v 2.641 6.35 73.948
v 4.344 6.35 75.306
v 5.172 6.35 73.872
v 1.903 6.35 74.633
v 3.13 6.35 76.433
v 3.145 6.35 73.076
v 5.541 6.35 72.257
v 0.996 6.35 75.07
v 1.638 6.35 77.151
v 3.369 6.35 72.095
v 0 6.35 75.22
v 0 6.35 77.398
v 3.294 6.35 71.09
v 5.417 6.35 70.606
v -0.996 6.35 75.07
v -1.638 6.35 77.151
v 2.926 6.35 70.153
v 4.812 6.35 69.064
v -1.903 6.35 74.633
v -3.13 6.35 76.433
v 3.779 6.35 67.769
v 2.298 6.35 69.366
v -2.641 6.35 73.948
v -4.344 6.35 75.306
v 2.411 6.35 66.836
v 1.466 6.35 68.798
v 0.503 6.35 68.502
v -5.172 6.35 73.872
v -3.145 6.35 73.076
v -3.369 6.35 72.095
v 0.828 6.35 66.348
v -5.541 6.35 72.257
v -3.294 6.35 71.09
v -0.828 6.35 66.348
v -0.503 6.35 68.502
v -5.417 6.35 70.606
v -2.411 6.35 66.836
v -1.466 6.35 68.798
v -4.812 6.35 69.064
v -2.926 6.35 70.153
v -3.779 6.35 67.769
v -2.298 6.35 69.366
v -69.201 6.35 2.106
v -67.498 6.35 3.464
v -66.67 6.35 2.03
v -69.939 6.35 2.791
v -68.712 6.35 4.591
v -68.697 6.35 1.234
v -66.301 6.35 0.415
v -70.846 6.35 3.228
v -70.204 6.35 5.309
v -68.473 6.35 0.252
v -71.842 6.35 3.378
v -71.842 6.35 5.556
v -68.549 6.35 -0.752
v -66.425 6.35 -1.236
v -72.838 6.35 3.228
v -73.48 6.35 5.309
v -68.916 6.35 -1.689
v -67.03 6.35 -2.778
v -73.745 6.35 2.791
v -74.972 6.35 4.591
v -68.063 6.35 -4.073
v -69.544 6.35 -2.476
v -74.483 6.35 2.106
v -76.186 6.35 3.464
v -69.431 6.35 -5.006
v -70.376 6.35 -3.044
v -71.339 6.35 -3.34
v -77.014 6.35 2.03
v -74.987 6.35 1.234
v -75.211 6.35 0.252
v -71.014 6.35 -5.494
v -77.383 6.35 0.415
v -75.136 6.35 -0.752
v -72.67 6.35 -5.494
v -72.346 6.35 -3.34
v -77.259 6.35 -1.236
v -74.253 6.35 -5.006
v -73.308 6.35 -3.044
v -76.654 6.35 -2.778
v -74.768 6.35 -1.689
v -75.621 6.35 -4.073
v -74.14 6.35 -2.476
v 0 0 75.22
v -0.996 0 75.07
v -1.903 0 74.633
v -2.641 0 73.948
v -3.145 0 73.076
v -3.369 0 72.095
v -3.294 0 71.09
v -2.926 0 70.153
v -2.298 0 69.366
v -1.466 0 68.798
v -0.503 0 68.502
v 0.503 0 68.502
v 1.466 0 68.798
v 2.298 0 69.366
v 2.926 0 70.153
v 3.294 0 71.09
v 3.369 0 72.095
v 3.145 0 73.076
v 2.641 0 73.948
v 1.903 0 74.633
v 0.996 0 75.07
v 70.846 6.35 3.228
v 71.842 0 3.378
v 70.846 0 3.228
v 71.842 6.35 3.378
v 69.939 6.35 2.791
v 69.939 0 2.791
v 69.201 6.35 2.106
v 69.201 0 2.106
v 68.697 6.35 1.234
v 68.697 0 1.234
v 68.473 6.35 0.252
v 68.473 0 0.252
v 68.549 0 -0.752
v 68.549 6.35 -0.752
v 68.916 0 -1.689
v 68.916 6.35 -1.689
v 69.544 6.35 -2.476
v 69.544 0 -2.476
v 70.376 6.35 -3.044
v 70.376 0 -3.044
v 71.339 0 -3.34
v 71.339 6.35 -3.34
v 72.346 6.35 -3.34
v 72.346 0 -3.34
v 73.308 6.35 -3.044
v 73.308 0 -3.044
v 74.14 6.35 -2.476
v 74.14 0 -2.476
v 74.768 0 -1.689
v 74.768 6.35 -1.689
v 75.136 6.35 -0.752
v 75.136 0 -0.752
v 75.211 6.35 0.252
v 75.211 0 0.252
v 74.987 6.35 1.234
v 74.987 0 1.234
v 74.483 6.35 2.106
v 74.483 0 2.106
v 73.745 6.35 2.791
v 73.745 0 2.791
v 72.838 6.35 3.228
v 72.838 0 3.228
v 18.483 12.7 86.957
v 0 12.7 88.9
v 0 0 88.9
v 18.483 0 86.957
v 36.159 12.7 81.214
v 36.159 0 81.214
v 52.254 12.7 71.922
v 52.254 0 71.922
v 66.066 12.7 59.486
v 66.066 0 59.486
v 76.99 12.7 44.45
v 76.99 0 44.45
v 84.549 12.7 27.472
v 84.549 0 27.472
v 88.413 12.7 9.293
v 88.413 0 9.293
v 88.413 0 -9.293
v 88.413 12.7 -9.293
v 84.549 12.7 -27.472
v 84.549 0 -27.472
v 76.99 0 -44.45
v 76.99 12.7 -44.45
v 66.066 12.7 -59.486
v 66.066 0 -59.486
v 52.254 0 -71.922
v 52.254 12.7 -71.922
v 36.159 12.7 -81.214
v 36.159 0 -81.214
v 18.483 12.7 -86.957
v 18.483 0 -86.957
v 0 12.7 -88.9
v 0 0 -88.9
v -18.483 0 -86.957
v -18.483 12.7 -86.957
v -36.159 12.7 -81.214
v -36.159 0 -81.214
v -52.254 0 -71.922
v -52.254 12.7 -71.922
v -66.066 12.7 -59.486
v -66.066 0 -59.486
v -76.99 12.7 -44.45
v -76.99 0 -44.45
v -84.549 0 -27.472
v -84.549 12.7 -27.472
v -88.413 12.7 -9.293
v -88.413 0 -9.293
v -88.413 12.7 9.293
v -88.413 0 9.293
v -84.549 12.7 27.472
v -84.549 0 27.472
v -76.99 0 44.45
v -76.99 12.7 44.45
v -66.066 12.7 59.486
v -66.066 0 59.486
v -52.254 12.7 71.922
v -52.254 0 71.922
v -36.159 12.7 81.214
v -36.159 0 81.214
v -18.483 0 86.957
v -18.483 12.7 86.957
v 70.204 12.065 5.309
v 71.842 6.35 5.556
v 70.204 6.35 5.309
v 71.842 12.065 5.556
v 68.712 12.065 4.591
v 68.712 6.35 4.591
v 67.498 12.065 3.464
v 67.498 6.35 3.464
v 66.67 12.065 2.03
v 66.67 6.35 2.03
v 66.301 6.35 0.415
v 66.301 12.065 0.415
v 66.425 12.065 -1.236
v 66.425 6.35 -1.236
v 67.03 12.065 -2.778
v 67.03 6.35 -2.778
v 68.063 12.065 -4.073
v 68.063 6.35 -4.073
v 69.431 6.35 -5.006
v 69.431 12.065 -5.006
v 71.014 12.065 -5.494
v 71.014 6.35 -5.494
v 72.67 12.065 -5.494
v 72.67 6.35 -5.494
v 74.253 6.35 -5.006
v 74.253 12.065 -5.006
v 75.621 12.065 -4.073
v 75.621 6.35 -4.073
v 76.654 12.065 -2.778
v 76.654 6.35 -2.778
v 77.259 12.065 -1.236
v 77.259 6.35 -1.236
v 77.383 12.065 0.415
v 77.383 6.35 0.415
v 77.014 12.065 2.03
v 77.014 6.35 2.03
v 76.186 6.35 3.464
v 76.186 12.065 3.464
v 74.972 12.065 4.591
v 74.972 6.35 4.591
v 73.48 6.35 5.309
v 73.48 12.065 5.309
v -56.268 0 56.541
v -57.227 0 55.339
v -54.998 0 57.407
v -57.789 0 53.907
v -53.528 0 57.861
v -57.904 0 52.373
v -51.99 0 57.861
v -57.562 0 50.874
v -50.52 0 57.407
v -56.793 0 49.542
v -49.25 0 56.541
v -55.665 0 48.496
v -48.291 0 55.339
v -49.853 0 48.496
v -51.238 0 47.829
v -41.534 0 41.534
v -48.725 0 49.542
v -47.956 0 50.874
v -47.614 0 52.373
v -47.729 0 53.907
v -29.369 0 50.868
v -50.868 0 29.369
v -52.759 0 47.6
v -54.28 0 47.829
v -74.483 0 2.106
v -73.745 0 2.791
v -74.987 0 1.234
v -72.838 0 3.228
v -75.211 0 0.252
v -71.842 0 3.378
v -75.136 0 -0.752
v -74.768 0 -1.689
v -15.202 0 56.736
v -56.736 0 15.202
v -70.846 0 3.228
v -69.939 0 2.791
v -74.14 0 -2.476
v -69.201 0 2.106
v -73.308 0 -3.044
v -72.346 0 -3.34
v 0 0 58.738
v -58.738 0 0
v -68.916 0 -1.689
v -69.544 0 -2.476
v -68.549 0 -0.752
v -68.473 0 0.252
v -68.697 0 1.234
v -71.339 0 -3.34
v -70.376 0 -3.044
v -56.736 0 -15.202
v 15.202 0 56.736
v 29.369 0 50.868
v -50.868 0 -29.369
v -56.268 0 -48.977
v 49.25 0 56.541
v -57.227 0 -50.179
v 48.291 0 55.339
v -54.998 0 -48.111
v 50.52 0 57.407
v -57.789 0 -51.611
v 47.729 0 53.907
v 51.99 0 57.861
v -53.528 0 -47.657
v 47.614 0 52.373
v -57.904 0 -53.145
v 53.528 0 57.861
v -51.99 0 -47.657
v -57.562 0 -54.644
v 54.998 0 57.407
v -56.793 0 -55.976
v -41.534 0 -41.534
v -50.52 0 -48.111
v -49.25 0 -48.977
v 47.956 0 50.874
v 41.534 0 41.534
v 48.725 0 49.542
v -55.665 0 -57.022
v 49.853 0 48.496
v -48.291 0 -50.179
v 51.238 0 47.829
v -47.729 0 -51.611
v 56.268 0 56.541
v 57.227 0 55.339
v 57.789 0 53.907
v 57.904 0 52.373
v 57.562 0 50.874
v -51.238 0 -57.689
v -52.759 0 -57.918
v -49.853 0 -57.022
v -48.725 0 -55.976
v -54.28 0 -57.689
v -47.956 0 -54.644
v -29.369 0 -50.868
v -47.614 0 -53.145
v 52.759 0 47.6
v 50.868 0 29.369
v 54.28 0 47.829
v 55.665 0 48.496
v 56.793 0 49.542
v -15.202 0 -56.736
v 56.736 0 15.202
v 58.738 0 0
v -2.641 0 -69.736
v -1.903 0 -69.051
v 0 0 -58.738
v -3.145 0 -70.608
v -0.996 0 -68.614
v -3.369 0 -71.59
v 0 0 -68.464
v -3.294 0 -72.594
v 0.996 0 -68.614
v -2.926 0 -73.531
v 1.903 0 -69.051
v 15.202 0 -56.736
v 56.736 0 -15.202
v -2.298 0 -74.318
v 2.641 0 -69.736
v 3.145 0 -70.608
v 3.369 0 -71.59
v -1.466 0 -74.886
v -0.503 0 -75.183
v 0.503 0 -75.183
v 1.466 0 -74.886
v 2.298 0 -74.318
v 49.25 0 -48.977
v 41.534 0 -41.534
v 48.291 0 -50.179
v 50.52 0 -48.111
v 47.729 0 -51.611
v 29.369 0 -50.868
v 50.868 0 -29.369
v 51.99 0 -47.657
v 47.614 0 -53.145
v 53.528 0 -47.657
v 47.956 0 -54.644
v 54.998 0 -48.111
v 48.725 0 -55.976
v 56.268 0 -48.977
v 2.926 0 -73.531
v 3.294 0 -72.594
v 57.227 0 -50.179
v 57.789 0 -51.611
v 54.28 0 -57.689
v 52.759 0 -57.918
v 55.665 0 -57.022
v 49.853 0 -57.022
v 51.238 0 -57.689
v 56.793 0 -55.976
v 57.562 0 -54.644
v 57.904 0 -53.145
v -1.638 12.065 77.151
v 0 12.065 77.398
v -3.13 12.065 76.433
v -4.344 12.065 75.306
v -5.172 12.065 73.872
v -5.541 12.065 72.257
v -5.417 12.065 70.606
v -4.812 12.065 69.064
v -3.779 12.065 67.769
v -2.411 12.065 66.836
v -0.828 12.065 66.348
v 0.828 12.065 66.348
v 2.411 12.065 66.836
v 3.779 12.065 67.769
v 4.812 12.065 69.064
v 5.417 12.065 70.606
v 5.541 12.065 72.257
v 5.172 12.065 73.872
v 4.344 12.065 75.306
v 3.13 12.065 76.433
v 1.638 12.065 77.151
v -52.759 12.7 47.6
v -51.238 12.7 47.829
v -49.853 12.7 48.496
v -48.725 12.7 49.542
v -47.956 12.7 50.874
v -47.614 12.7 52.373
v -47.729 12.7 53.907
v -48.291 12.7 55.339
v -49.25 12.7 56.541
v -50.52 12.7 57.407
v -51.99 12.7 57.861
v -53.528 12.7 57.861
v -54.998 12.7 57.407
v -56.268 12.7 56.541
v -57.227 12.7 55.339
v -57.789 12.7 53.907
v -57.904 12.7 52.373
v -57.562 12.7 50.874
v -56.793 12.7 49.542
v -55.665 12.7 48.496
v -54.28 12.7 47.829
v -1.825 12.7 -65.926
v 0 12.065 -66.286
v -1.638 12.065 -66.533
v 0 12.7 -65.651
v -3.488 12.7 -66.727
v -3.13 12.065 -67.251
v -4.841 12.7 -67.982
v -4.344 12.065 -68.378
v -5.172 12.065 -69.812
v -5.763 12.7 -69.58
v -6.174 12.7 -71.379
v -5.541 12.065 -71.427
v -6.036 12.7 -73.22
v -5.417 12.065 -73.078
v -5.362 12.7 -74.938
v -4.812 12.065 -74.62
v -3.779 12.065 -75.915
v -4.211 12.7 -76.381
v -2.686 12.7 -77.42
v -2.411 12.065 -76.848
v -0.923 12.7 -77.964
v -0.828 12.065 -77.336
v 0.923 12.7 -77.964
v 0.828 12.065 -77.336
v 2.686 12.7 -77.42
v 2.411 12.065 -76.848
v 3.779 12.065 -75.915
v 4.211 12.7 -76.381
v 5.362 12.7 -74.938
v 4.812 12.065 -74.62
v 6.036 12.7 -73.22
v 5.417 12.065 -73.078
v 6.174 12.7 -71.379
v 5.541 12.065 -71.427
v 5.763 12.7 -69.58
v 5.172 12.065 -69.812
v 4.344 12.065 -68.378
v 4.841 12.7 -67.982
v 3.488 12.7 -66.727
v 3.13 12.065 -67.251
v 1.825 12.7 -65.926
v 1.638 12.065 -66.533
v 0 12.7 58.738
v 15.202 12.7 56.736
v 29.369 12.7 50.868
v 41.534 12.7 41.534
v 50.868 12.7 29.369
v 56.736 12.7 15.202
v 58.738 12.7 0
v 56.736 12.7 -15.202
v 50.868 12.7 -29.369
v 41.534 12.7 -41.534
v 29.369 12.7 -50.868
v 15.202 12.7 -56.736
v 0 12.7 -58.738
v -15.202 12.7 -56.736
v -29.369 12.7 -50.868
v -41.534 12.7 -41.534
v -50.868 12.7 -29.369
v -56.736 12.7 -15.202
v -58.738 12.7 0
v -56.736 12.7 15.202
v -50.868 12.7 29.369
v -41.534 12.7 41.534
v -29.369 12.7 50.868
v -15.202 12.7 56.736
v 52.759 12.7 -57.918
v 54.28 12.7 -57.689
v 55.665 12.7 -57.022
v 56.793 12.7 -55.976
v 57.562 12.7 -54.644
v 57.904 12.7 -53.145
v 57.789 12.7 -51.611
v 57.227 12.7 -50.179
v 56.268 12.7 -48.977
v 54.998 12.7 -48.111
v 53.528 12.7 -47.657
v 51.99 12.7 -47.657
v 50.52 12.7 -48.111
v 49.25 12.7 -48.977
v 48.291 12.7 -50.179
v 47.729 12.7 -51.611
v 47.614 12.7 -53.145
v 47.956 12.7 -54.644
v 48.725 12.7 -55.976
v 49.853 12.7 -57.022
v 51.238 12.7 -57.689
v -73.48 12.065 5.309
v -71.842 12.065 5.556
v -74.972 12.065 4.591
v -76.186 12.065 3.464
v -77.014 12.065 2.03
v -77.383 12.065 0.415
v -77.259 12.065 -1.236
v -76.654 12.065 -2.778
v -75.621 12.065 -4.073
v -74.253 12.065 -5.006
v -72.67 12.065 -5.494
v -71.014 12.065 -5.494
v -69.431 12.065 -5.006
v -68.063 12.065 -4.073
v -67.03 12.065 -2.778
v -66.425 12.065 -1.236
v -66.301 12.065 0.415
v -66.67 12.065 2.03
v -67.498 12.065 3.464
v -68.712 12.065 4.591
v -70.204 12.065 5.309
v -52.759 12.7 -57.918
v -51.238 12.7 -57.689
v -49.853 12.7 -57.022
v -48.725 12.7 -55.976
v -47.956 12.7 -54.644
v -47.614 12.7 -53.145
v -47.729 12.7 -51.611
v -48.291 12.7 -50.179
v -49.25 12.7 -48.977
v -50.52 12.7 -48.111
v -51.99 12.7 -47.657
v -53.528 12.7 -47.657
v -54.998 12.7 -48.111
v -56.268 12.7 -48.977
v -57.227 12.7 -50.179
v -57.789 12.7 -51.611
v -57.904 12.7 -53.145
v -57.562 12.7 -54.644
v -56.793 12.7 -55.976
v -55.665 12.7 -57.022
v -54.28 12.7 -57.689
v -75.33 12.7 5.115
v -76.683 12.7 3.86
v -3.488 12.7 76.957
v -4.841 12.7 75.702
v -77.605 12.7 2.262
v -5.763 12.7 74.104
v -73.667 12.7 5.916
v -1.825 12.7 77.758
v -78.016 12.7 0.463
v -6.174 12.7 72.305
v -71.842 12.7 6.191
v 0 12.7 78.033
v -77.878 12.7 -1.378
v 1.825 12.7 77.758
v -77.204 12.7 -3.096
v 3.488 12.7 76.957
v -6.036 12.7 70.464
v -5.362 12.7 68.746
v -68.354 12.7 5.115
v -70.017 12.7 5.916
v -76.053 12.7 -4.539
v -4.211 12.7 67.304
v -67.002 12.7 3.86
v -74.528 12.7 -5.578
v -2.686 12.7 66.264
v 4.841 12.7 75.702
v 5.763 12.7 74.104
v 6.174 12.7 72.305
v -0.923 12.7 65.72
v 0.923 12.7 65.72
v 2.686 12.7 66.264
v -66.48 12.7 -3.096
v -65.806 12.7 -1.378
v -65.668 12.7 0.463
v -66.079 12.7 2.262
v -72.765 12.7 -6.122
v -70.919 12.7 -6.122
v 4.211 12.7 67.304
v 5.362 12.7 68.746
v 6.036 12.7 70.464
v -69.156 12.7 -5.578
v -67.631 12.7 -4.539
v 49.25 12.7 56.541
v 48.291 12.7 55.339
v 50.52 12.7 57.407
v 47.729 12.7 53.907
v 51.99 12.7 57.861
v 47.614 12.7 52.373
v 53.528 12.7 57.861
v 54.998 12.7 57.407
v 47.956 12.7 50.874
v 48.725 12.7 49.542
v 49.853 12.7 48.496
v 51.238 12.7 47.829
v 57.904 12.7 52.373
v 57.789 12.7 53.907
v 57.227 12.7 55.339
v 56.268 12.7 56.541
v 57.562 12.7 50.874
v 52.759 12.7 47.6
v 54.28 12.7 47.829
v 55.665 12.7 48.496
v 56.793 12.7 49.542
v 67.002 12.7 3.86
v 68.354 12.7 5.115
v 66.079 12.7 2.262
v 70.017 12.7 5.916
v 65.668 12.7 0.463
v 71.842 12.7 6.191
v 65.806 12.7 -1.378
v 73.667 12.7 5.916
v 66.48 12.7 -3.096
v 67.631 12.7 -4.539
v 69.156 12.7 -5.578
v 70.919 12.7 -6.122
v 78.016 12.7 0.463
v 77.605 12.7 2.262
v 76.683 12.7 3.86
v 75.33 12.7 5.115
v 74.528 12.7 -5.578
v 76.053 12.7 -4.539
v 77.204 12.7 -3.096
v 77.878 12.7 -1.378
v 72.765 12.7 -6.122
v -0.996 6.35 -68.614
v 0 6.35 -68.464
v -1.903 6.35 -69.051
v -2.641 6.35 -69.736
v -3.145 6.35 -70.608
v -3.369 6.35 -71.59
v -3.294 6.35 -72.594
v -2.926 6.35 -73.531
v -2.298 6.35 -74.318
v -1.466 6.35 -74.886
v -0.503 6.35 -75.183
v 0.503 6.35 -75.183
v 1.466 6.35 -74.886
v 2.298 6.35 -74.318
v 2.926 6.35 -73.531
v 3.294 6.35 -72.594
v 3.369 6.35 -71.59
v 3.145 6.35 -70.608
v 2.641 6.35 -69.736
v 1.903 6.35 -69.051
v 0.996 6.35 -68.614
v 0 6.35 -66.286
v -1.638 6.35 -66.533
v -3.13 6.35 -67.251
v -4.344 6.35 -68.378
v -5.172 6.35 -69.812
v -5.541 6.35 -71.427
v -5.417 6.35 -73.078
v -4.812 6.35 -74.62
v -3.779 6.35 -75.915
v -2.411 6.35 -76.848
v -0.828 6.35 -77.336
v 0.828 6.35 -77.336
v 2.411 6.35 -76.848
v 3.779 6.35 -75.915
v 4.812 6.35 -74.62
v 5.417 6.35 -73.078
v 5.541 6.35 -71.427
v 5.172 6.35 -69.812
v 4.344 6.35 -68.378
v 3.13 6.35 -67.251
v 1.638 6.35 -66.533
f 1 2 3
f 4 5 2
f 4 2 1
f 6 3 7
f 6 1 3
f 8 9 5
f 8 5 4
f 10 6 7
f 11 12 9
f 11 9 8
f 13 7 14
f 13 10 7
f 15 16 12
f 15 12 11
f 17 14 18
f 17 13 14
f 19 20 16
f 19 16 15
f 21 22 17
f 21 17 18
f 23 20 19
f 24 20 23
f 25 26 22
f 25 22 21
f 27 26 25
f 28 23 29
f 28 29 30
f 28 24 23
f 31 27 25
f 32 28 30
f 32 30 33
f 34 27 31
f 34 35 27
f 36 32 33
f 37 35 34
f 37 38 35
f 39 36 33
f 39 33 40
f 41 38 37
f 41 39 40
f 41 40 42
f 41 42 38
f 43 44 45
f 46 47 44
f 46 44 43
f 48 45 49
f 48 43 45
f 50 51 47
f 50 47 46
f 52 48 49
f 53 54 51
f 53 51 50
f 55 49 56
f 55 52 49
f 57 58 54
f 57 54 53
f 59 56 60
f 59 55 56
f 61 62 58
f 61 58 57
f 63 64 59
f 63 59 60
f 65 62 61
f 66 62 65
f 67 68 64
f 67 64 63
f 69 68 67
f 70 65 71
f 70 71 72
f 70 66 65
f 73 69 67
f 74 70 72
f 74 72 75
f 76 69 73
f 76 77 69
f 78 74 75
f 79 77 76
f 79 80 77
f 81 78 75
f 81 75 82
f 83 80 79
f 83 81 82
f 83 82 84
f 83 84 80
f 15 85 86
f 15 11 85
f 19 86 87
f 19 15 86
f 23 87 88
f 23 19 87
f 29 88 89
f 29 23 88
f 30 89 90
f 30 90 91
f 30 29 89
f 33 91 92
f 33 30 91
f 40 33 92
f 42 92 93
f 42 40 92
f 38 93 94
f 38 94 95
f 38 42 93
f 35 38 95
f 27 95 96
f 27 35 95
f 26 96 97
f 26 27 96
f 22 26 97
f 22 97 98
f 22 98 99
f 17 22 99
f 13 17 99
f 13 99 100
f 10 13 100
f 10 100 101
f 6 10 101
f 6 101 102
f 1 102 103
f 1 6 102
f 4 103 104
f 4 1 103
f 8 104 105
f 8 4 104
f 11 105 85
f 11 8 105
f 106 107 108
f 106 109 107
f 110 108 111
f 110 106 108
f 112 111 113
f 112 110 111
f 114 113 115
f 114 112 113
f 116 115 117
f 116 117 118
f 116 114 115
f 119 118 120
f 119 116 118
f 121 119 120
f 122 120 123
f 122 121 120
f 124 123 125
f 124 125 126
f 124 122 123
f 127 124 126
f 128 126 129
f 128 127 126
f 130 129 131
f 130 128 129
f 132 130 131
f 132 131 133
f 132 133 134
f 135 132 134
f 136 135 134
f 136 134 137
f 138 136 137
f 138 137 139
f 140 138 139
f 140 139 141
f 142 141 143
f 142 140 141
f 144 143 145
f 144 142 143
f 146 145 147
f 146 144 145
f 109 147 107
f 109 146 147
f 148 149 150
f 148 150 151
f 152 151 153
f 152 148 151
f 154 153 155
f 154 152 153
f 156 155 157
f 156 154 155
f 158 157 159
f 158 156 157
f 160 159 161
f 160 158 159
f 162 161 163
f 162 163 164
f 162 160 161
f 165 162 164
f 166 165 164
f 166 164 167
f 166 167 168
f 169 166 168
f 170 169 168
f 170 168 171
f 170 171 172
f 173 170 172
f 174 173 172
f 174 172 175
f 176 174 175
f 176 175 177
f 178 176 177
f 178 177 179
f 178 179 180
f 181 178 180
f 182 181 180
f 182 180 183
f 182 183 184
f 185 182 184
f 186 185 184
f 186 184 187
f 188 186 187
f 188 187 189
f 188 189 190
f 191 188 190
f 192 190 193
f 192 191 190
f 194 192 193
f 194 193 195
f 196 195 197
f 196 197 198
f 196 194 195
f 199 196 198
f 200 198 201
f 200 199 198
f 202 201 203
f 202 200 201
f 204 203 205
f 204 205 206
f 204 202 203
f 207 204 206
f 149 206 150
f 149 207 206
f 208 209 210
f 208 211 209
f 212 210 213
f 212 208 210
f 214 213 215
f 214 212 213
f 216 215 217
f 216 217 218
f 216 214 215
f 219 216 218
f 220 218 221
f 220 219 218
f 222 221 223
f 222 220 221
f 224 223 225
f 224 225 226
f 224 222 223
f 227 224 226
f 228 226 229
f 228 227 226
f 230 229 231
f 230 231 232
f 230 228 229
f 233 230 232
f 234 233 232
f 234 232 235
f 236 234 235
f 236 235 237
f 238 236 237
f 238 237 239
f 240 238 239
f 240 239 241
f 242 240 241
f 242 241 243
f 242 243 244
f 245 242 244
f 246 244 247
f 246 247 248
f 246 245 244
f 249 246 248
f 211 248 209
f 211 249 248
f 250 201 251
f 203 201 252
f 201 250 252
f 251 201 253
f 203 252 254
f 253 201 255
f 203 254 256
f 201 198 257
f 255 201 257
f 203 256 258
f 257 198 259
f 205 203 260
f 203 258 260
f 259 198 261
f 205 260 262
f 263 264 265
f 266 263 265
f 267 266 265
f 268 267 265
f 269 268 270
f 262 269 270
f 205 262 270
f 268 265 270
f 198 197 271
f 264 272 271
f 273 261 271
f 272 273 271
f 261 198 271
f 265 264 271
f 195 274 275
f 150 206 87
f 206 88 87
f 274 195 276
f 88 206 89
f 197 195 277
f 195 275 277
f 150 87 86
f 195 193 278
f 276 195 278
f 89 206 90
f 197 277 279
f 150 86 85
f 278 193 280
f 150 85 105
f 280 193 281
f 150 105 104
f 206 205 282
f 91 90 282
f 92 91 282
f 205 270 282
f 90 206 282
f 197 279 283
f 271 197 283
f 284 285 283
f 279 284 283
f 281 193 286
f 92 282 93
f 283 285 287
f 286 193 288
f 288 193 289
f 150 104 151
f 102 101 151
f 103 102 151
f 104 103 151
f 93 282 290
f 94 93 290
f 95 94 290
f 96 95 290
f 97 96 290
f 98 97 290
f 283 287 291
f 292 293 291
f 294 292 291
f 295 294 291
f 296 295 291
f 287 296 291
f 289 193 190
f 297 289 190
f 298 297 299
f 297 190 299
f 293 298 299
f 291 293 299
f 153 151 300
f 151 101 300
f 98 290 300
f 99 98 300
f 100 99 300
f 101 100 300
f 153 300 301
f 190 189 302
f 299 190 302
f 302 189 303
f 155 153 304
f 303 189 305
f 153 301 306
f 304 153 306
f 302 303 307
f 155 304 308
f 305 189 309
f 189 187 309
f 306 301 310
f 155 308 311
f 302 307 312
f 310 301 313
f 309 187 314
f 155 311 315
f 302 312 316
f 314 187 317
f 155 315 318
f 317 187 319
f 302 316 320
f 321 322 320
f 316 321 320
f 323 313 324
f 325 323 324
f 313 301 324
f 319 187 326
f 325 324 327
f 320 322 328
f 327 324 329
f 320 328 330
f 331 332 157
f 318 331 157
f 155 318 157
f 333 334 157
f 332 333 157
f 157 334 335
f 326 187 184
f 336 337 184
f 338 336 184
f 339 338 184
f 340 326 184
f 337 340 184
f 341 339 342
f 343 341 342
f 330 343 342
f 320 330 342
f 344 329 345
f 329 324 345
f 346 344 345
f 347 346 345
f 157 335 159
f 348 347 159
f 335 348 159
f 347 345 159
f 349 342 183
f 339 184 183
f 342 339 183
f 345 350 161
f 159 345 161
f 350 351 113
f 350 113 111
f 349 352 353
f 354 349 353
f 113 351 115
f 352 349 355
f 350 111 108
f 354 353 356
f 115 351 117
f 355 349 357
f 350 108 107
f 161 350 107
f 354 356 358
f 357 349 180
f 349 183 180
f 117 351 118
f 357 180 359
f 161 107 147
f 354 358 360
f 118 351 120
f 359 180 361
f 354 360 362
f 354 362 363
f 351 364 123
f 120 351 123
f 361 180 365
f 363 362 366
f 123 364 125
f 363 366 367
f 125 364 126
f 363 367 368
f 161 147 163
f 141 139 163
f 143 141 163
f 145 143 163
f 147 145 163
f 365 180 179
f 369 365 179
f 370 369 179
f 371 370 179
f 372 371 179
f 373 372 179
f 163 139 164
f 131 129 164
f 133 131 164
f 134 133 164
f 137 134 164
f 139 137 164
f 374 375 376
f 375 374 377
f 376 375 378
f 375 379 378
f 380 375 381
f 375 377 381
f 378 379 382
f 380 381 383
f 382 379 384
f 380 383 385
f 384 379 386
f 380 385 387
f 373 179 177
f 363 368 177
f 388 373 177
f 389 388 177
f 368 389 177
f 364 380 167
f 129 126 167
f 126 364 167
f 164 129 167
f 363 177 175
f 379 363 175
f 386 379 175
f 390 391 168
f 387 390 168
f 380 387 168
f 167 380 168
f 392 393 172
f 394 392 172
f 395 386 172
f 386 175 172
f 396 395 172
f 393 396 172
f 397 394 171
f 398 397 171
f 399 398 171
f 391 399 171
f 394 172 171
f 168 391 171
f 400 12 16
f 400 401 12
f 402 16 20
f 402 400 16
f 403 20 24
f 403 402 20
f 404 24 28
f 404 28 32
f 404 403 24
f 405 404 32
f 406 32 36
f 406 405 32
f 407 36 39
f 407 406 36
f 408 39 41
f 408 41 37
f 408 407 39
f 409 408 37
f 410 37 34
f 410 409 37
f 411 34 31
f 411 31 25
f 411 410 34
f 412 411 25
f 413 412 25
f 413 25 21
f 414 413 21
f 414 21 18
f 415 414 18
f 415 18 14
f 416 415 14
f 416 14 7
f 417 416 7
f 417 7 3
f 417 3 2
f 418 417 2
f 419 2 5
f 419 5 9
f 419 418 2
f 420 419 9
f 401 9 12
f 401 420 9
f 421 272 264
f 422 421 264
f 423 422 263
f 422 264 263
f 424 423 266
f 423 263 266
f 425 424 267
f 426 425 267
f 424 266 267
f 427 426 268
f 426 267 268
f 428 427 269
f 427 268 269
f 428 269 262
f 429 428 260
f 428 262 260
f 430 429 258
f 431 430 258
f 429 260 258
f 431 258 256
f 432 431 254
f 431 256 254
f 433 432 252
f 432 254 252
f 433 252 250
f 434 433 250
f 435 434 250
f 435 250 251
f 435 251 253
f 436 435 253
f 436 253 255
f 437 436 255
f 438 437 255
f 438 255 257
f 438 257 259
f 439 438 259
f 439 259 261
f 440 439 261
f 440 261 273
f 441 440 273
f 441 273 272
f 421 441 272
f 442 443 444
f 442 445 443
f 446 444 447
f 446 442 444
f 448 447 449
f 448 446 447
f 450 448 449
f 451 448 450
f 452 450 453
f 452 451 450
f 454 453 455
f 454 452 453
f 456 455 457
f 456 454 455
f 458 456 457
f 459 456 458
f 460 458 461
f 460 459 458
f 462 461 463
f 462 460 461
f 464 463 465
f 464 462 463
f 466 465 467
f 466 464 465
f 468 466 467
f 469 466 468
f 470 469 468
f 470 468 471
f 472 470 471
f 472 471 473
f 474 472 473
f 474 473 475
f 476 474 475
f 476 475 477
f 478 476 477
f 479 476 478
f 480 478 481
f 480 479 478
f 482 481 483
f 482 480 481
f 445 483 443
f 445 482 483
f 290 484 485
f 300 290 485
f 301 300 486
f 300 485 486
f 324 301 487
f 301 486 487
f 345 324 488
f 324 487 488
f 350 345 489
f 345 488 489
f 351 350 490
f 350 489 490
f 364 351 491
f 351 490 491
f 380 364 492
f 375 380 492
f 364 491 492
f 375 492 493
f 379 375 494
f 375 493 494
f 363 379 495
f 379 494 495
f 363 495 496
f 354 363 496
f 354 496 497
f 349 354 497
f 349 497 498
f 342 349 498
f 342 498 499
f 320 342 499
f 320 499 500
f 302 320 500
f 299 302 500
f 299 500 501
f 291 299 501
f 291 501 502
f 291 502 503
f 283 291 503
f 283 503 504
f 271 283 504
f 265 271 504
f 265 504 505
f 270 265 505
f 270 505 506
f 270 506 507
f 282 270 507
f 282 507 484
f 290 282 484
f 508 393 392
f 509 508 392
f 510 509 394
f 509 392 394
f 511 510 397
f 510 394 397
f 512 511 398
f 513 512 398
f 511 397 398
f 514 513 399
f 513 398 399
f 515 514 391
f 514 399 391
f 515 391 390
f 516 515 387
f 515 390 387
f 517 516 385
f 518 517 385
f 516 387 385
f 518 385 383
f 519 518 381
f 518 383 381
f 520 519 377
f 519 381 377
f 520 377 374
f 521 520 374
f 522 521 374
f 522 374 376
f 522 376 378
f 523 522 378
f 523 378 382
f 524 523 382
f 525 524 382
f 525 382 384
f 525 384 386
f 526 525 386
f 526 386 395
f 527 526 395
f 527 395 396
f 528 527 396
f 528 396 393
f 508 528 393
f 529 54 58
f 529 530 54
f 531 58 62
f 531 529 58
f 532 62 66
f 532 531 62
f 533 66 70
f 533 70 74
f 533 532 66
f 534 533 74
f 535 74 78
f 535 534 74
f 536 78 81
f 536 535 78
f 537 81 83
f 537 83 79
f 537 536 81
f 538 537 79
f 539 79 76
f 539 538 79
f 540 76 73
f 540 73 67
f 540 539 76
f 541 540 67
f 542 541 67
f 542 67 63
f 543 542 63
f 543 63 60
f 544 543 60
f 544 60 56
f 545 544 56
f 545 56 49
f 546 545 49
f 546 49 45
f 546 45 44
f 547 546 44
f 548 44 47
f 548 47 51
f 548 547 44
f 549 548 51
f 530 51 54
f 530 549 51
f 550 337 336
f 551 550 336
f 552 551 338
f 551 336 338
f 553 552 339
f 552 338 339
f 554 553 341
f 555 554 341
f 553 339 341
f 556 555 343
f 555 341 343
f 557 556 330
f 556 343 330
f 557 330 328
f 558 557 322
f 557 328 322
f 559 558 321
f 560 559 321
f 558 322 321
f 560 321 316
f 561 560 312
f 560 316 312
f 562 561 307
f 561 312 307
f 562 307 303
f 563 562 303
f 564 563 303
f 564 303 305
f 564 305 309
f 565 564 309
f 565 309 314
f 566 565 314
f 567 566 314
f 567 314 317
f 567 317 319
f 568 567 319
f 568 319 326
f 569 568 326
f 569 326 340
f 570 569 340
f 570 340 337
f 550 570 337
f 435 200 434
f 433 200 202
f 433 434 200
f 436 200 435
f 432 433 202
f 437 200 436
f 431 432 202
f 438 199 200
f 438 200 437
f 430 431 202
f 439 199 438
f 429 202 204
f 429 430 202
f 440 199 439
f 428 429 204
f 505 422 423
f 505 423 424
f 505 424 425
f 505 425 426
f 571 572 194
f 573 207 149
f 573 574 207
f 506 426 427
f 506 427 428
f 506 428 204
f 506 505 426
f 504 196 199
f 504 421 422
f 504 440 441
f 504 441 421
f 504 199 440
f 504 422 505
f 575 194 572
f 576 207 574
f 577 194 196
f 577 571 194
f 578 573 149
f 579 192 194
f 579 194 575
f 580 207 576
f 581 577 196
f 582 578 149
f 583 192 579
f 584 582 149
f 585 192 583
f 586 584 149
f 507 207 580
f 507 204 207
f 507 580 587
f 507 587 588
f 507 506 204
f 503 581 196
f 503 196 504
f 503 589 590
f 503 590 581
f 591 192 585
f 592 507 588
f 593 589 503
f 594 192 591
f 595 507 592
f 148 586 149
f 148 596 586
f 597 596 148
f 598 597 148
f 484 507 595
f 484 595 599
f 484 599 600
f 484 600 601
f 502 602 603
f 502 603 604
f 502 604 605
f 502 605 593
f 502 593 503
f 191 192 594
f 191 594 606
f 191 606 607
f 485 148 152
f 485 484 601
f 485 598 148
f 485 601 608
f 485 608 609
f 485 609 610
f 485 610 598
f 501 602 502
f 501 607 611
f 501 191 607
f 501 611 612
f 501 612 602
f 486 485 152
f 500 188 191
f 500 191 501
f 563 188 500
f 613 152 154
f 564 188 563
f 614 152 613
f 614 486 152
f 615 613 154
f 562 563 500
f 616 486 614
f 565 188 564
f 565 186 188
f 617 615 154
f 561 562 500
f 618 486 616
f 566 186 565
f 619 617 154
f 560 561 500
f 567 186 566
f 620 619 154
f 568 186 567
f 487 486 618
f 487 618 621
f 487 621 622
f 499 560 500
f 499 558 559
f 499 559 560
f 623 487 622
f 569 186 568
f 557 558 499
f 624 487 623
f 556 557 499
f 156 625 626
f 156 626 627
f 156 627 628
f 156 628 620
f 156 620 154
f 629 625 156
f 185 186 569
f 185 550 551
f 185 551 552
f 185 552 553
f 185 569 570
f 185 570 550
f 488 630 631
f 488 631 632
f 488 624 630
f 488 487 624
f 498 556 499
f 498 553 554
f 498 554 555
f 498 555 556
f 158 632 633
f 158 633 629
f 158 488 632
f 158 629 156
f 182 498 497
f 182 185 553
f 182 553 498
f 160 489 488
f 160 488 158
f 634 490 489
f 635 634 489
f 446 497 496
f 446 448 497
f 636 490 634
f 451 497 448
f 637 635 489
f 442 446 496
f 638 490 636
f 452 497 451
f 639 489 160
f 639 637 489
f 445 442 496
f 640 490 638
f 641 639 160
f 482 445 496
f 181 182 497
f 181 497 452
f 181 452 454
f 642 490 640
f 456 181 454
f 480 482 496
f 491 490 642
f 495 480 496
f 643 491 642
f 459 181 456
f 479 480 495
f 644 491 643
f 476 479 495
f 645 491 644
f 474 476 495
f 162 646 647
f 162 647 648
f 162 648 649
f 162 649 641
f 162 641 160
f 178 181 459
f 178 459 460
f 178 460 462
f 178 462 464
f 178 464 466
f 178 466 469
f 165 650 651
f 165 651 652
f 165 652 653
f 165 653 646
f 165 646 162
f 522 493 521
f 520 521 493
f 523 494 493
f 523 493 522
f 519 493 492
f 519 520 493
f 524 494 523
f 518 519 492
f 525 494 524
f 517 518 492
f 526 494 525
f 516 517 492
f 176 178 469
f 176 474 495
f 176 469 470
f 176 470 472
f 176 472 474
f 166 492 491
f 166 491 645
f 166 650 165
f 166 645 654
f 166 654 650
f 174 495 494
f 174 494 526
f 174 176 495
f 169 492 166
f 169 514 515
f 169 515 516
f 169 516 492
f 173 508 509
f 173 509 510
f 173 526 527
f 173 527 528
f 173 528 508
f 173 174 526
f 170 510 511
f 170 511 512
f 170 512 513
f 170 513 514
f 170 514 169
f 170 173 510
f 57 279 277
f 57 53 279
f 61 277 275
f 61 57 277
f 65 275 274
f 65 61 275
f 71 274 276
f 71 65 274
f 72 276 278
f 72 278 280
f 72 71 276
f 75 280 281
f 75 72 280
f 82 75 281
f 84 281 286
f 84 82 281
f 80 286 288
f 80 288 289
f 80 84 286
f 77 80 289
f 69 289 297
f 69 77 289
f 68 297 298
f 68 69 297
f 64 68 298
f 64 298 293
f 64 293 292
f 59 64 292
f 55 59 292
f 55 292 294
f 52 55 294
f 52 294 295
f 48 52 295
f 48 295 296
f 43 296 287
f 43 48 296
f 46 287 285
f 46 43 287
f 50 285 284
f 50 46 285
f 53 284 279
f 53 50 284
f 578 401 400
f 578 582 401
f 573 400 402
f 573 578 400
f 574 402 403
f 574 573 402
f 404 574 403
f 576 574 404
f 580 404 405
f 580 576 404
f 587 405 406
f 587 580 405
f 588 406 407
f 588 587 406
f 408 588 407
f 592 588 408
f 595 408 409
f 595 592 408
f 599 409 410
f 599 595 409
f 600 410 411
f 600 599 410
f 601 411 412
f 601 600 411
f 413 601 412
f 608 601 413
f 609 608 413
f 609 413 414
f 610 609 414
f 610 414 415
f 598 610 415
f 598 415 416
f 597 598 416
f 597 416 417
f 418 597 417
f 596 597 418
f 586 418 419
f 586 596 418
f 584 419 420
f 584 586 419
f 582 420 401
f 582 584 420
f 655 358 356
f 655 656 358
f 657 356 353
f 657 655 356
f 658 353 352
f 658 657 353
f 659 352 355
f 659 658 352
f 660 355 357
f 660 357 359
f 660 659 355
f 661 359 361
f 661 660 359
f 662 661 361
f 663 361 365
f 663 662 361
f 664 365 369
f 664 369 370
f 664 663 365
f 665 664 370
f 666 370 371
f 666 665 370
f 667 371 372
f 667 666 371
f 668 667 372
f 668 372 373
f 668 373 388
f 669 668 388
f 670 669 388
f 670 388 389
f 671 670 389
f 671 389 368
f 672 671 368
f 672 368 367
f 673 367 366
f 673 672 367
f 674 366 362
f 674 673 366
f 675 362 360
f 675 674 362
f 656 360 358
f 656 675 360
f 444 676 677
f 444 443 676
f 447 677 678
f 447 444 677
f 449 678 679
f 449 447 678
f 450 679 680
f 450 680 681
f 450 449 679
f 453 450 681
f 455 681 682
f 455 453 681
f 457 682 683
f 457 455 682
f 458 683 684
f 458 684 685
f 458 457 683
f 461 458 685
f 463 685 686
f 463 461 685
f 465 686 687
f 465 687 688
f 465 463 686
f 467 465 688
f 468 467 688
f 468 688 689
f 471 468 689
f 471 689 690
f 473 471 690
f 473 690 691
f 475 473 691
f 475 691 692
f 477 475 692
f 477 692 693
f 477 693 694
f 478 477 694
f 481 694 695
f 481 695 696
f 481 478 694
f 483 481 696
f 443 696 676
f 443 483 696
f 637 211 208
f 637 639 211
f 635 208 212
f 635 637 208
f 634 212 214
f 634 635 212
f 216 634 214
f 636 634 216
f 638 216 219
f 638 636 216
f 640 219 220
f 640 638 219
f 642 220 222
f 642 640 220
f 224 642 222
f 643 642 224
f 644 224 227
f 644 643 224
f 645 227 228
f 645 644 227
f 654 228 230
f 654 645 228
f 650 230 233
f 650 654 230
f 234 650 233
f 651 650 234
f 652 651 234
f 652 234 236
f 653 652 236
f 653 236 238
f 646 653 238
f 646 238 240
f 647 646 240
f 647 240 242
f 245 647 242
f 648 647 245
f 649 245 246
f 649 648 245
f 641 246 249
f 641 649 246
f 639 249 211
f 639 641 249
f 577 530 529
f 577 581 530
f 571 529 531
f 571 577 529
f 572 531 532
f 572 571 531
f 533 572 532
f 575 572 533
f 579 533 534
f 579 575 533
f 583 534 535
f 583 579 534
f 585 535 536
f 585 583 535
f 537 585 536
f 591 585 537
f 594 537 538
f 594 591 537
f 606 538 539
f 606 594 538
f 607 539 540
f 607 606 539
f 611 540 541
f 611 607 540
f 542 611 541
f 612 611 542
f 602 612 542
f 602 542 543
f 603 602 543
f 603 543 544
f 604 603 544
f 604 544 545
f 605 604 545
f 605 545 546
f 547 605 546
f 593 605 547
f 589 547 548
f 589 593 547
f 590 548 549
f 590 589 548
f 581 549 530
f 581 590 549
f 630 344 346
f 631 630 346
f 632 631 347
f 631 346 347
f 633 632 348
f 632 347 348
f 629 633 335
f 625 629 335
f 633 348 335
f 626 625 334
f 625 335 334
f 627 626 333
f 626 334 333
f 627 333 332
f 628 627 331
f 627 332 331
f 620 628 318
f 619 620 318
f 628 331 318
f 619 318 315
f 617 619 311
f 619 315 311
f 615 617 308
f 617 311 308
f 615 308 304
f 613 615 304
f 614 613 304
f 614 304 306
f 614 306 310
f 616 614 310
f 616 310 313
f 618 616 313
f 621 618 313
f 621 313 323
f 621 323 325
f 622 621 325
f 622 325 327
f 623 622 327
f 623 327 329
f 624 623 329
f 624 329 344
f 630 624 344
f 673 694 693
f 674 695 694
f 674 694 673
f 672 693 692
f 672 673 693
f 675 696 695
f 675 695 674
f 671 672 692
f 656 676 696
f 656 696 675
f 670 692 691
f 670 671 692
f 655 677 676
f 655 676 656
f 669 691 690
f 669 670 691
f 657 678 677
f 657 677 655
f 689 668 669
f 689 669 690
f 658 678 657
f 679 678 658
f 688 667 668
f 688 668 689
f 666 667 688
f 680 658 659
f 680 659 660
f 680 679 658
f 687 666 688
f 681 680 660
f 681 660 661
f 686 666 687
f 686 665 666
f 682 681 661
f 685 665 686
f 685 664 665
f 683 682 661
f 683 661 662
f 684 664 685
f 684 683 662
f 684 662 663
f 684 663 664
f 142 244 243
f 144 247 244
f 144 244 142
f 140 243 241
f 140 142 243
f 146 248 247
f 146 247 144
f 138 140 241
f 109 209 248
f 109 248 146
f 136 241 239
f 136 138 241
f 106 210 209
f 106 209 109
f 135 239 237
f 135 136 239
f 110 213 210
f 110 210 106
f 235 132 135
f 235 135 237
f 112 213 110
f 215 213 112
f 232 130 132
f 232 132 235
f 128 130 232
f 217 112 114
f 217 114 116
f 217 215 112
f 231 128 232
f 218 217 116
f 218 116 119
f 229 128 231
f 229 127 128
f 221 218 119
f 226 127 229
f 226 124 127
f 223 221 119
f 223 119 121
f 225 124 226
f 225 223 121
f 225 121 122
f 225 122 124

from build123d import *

# Parameters (mm, degrees)
SKETCH1_W                                     = 177.8
SKETCH1_H                                     = 177.8
BOSS_EXTRUDE1_DEPTH                           = 12.7
F_13_32_0_40625_DIAMETER_HOLE1_D              = 10.31875
F_13_32_0_40625_DIAMETER_HOLE1_DEPTH          = 25.4
F_13_32_0_40625_DIAMETER_HOLE1_TIP            = 3.100065256
SKETCH4_R                                     = 58.7375
CUT_EXTRUDE1_DEPTH                            = 127.363404513
SKETCH5_OUTSIDE_W                             = 230.154
SKETCH5_OUTSIDE_H                             = 230.154
SKETCH5_OUTSIDE_R                             = 88.9
CUT_EXTRUDE2_DEPTH                            = 12.7
CBORE_FOR_1_4_SOCKET_HEAD_CAP_SCREW1_AT_COUNT = 2
CBORE_FOR_1_4_SOCKET_HEAD_CAP_SCREW1_AT_PITCH = 101.6
CBORE_FOR_1_4_SOCKET_HEAD_CAP_SCREW1_2_COUNT  = 2
CBORE_FOR_1_4_SOCKET_HEAD_CAP_SCREW1_2_PITCH  = 101.6
CBORE_FOR_1_4_SOCKET_HEAD_CAP_SCREW1_3_COUNT  = 2
CBORE_FOR_1_4_SOCKET_HEAD_CAP_SCREW1_3_PITCH  = 143.684097937


with BuildPart() as part:
    # Sketch1 → Boss-Extrude1 (new body)
    with BuildSketch(Plane(origin=(0, 0, 0), x_dir=(1, 0, 0), z_dir=(0, 1, 0))):
        Rectangle(SKETCH1_W, SKETCH1_H)
    extrude(amount=BOSS_EXTRUDE1_DEPTH)

    # 13/32 (0.40625) Diameter Hole1
    with Locations(Plane(origin=(-52.759004711, 12.7, -52.759004711), x_dir=(0, 0, 1), z_dir=(0, 1, 0))):
        with Locations((0, 0), (0, 105.518009422), (105.518009422, 105.518009422), (105.518009422, 0)):
            Hole(F_13_32_0_40625_DIAMETER_HOLE1_D / 2, depth=F_13_32_0_40625_DIAMETER_HOLE1_DEPTH)
            with Locations((0, 0, -(F_13_32_0_40625_DIAMETER_HOLE1_DEPTH + F_13_32_0_40625_DIAMETER_HOLE1_TIP / 2))):  # 118° drill point
                Cone(0, F_13_32_0_40625_DIAMETER_HOLE1_D / 2, F_13_32_0_40625_DIAMETER_HOLE1_TIP, mode=Mode.SUBTRACT)

    # Sketch4 → Cut-Extrude1 (cut, through all)
    with BuildSketch(Plane(origin=(0, 12.7, 0), x_dir=(1, 0, 0), z_dir=(0, 1, 0))):
        with Locations(Location((0, 0, 0), (0, 0, 270))):
            Circle(SKETCH4_R)
    extrude(amount=-CUT_EXTRUDE1_DEPTH, mode=Mode.SUBTRACT)

    # Sketch5 outside → Cut-Extrude2 (cut)
    with BuildSketch(Plane(origin=(0, 12.7, 0), x_dir=(1, 0, 0), z_dir=(0, 1, 0))):
        Rectangle(SKETCH5_OUTSIDE_W, SKETCH5_OUTSIDE_H)
        with Locations(Location((0, 0, 0), (0, 0, 270))):
            Circle(SKETCH5_OUTSIDE_R, mode=Mode.SUBTRACT)
    extrude(amount=-CUT_EXTRUDE2_DEPTH, mode=Mode.SUBTRACT)

    # Sketch9 → CBORE for 1/4 Socket Head Cap Screw1 (revolve, cut)
    with BuildSketch(Plane(origin=(0, 12.7, -71.842048969), x_dir=(0, 0, 1), z_dir=(1, 0, 0))):
        Polygon((0, 0), (0, 12.7), (3.3782, 12.7), (3.3782, 6.35), (5.55625, 6.35), (5.55625, 0.635), (6.19125, 0), align=None)
    cbore_for_1_4_socket_head_cap_screw1 = revolve(axis=Axis((0, 19.05, -71.842048969), (0, -1, 0)), mode=Mode.SUBTRACT)

    # CBORE for 1/4 Socket Head Cap Screw1 at: CBORE for 1/4 Socket Head Cap Screw1 ×2
    with Locations(*[Vector(0.7071067811865476, 0, 0.7071067811865476) * (i * CBORE_FOR_1_4_SOCKET_HEAD_CAP_SCREW1_AT_PITCH) for i in range(1, CBORE_FOR_1_4_SOCKET_HEAD_CAP_SCREW1_AT_COUNT)]):
        add(cbore_for_1_4_socket_head_cap_screw1, mode=Mode.SUBTRACT)

    # CBORE for 1_4 Socket Head Cap Screw1 2: CBORE for 1/4 Socket Head Cap Screw1 ×2
    with Locations(*[Vector(-0.7071067811865475, 0, 0.7071067811865476) * (i * CBORE_FOR_1_4_SOCKET_HEAD_CAP_SCREW1_2_PITCH) for i in range(1, CBORE_FOR_1_4_SOCKET_HEAD_CAP_SCREW1_2_COUNT)]):
        add(cbore_for_1_4_socket_head_cap_screw1, mode=Mode.SUBTRACT)

    # CBORE for 1_4 Socket Head Cap Screw1 3: CBORE for 1/4 Socket Head Cap Screw1 ×2
    with Locations(*[(0, 0, i * CBORE_FOR_1_4_SOCKET_HEAD_CAP_SCREW1_3_PITCH) for i in range(1, CBORE_FOR_1_4_SOCKET_HEAD_CAP_SCREW1_3_COUNT)]):
        add(cbore_for_1_4_socket_head_cap_screw1, mode=Mode.SUBTRACT)


solid = part.part
